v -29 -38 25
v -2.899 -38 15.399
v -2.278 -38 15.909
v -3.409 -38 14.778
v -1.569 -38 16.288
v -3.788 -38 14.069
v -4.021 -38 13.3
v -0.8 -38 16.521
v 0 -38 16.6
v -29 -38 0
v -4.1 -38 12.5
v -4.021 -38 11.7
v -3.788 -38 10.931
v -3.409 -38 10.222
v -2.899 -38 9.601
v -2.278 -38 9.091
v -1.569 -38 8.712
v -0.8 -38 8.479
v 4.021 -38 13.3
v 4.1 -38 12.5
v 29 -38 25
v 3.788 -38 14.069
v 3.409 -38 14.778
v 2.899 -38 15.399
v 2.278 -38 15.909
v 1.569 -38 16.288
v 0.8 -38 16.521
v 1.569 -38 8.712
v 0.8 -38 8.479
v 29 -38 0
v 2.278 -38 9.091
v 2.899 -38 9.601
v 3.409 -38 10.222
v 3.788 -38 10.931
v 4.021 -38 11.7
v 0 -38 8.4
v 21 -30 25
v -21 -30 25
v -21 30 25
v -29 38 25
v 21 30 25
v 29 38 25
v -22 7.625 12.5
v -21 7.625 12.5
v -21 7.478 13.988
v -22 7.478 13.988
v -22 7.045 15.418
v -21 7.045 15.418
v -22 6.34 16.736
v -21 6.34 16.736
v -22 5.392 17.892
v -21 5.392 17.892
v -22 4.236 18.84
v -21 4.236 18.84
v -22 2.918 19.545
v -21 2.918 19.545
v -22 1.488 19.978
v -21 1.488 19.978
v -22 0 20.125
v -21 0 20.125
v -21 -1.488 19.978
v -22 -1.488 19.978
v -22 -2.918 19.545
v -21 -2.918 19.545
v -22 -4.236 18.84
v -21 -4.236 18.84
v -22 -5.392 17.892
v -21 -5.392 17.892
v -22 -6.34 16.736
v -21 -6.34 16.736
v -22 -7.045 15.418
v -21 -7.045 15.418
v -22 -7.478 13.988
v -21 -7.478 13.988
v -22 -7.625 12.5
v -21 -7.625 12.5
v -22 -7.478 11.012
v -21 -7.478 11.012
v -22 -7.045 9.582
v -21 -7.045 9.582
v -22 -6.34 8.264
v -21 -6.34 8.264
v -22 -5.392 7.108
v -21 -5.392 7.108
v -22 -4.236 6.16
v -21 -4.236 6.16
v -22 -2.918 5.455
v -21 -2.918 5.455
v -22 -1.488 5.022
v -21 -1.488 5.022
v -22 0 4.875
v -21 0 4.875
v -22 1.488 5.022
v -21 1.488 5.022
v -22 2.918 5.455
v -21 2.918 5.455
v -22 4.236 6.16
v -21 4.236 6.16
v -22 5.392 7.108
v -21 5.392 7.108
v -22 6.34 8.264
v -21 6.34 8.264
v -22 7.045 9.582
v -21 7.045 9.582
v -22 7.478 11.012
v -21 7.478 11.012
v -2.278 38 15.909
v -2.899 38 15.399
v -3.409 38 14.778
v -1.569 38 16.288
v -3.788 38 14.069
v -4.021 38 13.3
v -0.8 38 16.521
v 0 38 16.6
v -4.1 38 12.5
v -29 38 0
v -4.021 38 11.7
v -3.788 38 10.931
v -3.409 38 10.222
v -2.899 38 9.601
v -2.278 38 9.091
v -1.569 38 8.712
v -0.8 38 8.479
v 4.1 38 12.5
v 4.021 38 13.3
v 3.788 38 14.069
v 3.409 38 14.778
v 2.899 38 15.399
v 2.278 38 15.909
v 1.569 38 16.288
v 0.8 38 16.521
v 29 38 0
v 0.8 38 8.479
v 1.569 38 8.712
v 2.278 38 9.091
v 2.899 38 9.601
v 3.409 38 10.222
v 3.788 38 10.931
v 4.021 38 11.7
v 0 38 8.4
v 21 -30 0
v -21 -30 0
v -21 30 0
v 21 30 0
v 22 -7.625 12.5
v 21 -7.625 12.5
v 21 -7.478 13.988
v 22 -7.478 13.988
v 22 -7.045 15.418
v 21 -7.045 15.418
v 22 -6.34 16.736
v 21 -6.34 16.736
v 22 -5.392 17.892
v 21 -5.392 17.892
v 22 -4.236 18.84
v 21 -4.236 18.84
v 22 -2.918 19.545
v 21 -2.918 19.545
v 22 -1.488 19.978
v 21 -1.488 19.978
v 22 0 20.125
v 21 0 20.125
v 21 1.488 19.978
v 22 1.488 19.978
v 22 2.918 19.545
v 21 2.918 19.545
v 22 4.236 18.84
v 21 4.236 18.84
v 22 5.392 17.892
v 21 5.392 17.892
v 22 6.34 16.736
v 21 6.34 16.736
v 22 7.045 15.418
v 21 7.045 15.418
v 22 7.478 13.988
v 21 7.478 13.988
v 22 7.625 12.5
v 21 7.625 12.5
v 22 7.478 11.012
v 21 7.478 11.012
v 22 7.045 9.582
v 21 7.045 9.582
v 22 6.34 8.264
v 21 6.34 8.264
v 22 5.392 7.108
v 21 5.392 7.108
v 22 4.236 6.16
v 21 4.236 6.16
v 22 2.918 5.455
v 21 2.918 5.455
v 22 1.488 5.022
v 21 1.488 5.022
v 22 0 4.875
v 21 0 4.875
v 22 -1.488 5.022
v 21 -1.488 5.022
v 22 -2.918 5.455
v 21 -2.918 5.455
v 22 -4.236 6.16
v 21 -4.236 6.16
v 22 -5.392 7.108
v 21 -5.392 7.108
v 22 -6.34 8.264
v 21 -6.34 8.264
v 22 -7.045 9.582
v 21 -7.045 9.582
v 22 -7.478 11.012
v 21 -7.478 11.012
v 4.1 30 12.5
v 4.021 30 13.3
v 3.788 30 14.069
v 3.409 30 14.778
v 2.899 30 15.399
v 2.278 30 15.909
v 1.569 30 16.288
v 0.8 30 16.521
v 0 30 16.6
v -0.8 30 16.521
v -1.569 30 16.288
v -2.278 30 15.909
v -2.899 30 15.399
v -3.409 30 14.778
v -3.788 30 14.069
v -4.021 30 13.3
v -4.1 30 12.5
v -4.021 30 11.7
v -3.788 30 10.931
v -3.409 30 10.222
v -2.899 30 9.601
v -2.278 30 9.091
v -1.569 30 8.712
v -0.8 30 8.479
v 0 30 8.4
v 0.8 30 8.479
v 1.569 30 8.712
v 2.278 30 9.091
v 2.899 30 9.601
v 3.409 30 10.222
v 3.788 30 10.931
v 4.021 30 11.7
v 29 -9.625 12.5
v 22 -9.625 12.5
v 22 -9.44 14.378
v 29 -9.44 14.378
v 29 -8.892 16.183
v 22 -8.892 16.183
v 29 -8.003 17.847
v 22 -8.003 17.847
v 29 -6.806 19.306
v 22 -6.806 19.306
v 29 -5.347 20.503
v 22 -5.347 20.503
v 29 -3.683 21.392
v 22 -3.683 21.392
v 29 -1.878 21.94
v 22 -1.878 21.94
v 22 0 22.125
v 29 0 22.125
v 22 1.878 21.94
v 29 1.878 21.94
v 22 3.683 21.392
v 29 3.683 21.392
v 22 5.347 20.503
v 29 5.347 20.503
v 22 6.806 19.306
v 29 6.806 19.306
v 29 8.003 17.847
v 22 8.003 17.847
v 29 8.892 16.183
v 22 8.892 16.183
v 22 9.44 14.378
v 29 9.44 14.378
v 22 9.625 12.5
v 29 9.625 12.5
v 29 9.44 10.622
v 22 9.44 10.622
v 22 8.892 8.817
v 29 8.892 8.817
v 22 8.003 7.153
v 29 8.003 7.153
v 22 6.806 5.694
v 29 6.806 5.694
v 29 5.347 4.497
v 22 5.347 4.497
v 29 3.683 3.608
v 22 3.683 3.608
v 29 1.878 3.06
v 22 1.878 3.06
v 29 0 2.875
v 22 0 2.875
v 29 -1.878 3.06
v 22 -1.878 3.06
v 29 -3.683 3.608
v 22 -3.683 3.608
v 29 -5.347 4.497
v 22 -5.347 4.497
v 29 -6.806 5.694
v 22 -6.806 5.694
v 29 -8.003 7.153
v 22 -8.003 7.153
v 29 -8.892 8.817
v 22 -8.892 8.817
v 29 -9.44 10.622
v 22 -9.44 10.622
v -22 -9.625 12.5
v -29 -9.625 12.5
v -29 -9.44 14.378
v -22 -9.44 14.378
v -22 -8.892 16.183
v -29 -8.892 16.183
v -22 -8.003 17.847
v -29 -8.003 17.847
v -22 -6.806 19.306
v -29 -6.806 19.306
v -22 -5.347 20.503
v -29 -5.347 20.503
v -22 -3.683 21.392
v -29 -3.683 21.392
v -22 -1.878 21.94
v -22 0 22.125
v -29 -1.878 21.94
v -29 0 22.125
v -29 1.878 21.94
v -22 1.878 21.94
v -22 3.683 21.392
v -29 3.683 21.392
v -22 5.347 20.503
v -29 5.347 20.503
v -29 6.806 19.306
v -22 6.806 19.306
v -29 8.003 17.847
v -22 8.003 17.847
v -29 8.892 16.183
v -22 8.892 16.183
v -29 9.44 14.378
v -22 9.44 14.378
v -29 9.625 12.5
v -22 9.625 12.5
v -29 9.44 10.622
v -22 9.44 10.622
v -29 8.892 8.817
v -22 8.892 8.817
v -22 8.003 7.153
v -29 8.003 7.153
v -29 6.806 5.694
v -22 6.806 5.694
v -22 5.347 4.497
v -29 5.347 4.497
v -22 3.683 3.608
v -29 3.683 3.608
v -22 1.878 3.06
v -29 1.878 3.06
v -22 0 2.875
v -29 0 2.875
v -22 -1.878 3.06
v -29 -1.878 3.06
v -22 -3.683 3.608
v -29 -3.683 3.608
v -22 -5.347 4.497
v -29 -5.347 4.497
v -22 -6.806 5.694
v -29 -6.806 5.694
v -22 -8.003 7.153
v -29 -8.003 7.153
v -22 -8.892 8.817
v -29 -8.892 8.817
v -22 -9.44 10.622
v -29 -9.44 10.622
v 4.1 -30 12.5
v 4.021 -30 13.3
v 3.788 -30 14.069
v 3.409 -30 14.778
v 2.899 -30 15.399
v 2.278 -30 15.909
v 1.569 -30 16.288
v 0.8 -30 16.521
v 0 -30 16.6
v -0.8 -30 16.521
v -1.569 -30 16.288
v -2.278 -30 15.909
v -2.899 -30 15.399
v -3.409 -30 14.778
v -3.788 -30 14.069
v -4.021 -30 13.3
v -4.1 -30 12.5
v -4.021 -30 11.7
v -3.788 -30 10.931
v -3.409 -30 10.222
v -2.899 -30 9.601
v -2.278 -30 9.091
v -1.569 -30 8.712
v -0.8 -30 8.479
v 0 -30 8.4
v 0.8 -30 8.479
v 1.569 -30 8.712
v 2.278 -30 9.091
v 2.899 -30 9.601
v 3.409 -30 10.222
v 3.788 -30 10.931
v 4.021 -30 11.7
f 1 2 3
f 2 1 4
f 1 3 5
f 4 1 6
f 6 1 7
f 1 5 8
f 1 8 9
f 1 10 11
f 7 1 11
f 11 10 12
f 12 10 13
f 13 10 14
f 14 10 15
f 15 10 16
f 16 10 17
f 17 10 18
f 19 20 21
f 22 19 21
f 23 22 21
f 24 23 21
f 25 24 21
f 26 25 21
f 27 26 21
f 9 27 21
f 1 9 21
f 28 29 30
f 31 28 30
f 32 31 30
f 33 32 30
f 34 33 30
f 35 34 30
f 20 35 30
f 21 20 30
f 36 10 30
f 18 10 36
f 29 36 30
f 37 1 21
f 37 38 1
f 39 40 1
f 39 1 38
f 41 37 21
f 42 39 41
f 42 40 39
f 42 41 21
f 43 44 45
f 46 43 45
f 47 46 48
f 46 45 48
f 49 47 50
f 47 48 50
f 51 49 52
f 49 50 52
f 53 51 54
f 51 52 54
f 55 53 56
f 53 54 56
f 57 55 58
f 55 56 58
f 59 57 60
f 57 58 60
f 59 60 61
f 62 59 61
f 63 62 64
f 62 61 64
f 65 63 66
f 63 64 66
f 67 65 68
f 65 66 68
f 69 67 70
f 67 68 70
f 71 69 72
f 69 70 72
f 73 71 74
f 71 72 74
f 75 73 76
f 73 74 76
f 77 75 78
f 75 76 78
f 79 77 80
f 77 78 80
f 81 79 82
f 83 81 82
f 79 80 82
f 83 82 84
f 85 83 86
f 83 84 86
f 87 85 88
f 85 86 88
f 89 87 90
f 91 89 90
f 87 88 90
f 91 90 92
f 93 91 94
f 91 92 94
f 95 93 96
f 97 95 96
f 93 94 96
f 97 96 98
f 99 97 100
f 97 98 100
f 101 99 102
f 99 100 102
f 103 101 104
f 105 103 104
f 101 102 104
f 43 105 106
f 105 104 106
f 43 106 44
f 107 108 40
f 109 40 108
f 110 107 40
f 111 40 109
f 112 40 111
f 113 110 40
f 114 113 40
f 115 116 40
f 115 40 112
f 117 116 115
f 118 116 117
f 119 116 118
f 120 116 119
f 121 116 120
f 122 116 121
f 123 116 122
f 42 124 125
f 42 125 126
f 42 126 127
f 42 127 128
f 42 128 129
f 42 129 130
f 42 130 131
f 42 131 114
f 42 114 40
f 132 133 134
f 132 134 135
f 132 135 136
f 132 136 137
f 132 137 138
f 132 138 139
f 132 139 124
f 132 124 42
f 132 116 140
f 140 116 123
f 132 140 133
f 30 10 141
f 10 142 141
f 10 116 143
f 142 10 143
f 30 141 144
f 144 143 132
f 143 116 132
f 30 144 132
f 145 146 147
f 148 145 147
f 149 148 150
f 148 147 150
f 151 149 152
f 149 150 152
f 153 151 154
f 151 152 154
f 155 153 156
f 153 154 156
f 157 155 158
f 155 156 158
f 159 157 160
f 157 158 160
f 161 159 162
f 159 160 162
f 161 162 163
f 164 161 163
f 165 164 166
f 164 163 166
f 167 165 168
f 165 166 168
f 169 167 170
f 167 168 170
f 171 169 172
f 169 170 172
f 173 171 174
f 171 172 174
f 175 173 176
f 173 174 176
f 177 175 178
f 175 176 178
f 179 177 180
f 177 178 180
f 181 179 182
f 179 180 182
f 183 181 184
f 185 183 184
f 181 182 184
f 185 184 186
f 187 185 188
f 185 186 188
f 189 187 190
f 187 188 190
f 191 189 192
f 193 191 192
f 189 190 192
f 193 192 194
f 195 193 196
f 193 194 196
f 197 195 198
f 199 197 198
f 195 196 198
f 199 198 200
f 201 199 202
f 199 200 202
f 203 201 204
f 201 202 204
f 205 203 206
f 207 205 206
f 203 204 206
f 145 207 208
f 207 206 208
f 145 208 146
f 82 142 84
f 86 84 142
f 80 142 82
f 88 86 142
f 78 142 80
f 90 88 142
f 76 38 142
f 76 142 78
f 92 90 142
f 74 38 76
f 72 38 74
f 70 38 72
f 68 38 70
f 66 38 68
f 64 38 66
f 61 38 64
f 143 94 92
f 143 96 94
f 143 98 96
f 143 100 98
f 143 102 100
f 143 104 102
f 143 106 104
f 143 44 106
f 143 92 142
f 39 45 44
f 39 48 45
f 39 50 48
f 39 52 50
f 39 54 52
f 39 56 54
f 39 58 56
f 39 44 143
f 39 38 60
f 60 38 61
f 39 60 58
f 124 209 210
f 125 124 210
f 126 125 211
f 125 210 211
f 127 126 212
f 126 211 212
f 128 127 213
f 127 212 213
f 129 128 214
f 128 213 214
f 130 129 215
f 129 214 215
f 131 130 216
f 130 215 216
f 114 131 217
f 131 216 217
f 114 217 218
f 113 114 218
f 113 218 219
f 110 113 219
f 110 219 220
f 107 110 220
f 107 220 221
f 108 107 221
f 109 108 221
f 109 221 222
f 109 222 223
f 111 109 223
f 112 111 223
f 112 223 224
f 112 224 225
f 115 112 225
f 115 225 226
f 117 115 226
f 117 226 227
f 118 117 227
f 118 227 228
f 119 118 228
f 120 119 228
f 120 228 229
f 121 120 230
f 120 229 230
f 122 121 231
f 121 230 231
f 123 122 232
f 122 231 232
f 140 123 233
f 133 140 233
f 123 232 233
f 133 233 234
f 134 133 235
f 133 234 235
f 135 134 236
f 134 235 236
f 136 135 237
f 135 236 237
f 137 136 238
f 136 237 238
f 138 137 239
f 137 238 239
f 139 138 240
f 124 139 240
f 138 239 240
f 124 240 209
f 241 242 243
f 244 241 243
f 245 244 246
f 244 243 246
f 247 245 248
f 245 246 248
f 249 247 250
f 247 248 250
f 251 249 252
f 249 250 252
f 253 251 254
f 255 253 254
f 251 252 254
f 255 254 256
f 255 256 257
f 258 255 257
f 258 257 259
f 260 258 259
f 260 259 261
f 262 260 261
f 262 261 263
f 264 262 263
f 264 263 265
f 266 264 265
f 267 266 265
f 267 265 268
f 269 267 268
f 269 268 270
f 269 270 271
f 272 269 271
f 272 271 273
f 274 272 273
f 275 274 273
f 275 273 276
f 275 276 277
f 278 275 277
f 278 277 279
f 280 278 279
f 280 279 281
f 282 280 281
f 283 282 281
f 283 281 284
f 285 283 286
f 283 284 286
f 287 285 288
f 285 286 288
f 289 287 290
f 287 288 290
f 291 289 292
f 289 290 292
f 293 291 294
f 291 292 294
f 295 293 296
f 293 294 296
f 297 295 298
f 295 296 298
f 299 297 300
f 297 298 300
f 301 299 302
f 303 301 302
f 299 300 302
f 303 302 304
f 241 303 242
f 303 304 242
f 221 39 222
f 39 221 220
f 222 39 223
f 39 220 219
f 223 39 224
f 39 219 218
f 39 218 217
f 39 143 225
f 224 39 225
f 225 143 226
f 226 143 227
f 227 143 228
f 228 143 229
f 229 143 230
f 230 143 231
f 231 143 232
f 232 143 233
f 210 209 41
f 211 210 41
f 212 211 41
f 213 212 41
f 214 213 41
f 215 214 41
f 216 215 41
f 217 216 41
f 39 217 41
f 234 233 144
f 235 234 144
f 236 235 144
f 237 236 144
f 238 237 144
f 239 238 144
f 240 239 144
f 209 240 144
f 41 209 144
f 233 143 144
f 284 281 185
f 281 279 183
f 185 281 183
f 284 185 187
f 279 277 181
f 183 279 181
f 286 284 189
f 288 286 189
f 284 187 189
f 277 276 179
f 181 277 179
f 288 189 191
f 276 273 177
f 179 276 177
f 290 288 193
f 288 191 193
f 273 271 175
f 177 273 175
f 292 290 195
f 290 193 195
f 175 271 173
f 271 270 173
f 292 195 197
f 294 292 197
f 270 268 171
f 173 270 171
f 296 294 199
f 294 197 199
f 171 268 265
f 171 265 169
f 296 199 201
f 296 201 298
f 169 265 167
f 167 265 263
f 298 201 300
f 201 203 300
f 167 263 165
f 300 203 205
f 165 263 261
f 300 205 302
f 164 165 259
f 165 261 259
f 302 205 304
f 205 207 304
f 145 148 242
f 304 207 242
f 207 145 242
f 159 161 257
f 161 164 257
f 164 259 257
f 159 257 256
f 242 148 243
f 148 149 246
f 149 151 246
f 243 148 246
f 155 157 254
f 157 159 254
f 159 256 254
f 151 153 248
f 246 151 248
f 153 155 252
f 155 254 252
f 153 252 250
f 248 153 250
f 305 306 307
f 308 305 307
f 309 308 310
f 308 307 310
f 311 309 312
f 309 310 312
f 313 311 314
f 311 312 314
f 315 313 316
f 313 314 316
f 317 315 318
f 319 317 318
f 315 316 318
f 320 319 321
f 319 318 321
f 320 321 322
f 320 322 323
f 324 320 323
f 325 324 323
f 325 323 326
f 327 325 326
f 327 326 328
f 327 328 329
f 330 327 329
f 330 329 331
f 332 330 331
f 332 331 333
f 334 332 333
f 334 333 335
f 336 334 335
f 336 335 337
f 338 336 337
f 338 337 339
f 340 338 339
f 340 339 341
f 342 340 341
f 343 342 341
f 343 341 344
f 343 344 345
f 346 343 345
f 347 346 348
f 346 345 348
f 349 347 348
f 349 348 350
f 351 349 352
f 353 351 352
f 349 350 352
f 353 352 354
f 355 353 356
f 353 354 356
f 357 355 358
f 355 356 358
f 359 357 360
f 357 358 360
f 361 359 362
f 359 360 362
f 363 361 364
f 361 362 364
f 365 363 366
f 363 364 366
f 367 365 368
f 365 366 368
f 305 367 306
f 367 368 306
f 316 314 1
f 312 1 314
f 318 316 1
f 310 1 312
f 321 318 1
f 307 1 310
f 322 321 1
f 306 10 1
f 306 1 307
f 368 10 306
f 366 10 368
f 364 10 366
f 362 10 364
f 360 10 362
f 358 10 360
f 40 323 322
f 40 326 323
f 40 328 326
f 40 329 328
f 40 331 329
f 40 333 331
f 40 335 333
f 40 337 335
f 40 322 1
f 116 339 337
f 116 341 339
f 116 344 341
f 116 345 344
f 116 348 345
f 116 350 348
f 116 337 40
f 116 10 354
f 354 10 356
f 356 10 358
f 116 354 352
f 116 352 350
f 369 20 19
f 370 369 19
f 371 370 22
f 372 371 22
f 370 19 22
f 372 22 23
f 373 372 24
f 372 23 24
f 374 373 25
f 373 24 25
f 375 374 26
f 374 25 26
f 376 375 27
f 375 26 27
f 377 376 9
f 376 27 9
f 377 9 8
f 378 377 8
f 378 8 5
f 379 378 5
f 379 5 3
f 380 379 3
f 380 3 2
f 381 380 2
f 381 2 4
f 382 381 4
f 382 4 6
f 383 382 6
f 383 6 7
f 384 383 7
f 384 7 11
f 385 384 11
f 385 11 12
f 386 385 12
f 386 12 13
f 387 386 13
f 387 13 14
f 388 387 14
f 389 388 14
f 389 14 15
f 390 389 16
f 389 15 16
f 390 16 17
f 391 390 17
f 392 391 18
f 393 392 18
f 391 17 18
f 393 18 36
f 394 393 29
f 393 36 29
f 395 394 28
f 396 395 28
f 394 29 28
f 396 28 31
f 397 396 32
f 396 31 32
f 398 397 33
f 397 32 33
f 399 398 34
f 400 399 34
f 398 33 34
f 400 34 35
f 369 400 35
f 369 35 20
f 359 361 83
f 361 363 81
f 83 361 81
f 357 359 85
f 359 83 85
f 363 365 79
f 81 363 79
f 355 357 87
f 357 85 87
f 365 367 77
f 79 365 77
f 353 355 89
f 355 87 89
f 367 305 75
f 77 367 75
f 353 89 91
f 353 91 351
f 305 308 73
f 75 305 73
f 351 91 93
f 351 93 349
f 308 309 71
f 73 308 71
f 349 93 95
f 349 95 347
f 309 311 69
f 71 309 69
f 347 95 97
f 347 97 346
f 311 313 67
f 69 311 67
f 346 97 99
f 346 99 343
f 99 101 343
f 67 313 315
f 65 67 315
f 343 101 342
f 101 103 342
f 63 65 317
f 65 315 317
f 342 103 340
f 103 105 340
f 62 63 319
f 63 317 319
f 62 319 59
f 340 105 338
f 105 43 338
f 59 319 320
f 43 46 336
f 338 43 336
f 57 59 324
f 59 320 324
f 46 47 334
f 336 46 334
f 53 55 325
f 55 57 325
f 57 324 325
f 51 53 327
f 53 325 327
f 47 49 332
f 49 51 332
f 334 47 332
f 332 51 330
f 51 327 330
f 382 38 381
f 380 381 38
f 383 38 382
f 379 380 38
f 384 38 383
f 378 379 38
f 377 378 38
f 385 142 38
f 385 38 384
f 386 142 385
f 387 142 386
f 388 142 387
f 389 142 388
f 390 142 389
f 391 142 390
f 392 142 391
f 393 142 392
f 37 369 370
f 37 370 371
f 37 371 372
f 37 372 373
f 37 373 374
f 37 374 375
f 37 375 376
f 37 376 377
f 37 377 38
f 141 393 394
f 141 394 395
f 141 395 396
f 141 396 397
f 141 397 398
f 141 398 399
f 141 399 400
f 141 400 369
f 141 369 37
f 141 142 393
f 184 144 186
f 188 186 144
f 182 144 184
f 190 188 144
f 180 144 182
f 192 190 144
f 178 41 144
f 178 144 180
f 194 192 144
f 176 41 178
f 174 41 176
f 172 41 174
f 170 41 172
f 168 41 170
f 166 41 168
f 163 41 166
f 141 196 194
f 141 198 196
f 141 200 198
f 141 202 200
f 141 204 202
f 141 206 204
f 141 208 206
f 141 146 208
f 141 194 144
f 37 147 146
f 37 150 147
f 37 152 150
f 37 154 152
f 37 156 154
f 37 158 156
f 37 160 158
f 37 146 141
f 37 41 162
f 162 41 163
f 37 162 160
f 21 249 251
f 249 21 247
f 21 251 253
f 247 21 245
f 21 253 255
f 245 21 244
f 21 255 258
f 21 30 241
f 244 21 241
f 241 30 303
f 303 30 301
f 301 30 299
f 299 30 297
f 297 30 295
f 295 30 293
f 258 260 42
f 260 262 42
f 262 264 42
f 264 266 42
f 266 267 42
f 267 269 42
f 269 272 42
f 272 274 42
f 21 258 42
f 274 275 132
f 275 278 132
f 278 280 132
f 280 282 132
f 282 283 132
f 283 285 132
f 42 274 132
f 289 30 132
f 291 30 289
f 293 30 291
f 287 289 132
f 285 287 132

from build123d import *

# Parameters (mm, degrees)
F0_W     = 58
F0_H     = 76
F0_W_2   = 42
F0_H_2   = 60
F1_DEPTH = 25
F2_R     = 9.625
F3_DEPTH = 58
F4_R     = 4.1
F5_DEPTH = 76
F6_R     = 9.625
F6_R_2   = 7.625
F7_DEPTH = 1
F8_R     = 9.625
F8_R_2   = 7.625
F9_DEPTH = 1


with BuildPart() as f1:
    # F0 (on Top) → F1 (new body)
    with BuildSketch(Plane.XY):
        Rectangle(F0_W, F0_H)
        Rectangle(F0_W_2, F0_H_2, mode=Mode.SUBTRACT)
    extrude(amount=F1_DEPTH)

    # F2 (on face) → F3 (cut, through all)
    with BuildSketch(Plane(origin=(-29, 0, 0), x_dir=(0, -1, 0), z_dir=(-1, 0, 0))):
        with Locations((0, 12.5)):
            Circle(F2_R)
    extrude(amount=-F3_DEPTH, mode=Mode.SUBTRACT)

    # F4 (on face) → F5 (cut, through all)
    with BuildSketch(Plane.XZ.offset(38)):
        with Locations((0, 12.5)):
            Circle(F4_R)
    extrude(amount=-F5_DEPTH, mode=Mode.SUBTRACT)

    # F6 (on face) → F7 (join)
    with BuildSketch(Plane(origin=(21, 0, 0), x_dir=(0, -1, 0), z_dir=(-1, 0, 0))):
        with Locations((0, 12.5)):
            Circle(F6_R)
        with Locations((0, 12.5)):
            Circle(F6_R_2, mode=Mode.SUBTRACT)
    extrude(amount=-F7_DEPTH)

    # F8 (on face) → F9 (join)
    with BuildSketch(Plane.YZ.offset(-21)):
        with Locations((0, 12.5)):
            Circle(F8_R)
        with Locations((0, 12.5)):
            Circle(F8_R_2, mode=Mode.SUBTRACT)
    extrude(amount=-F9_DEPTH)


solid = f1.part
